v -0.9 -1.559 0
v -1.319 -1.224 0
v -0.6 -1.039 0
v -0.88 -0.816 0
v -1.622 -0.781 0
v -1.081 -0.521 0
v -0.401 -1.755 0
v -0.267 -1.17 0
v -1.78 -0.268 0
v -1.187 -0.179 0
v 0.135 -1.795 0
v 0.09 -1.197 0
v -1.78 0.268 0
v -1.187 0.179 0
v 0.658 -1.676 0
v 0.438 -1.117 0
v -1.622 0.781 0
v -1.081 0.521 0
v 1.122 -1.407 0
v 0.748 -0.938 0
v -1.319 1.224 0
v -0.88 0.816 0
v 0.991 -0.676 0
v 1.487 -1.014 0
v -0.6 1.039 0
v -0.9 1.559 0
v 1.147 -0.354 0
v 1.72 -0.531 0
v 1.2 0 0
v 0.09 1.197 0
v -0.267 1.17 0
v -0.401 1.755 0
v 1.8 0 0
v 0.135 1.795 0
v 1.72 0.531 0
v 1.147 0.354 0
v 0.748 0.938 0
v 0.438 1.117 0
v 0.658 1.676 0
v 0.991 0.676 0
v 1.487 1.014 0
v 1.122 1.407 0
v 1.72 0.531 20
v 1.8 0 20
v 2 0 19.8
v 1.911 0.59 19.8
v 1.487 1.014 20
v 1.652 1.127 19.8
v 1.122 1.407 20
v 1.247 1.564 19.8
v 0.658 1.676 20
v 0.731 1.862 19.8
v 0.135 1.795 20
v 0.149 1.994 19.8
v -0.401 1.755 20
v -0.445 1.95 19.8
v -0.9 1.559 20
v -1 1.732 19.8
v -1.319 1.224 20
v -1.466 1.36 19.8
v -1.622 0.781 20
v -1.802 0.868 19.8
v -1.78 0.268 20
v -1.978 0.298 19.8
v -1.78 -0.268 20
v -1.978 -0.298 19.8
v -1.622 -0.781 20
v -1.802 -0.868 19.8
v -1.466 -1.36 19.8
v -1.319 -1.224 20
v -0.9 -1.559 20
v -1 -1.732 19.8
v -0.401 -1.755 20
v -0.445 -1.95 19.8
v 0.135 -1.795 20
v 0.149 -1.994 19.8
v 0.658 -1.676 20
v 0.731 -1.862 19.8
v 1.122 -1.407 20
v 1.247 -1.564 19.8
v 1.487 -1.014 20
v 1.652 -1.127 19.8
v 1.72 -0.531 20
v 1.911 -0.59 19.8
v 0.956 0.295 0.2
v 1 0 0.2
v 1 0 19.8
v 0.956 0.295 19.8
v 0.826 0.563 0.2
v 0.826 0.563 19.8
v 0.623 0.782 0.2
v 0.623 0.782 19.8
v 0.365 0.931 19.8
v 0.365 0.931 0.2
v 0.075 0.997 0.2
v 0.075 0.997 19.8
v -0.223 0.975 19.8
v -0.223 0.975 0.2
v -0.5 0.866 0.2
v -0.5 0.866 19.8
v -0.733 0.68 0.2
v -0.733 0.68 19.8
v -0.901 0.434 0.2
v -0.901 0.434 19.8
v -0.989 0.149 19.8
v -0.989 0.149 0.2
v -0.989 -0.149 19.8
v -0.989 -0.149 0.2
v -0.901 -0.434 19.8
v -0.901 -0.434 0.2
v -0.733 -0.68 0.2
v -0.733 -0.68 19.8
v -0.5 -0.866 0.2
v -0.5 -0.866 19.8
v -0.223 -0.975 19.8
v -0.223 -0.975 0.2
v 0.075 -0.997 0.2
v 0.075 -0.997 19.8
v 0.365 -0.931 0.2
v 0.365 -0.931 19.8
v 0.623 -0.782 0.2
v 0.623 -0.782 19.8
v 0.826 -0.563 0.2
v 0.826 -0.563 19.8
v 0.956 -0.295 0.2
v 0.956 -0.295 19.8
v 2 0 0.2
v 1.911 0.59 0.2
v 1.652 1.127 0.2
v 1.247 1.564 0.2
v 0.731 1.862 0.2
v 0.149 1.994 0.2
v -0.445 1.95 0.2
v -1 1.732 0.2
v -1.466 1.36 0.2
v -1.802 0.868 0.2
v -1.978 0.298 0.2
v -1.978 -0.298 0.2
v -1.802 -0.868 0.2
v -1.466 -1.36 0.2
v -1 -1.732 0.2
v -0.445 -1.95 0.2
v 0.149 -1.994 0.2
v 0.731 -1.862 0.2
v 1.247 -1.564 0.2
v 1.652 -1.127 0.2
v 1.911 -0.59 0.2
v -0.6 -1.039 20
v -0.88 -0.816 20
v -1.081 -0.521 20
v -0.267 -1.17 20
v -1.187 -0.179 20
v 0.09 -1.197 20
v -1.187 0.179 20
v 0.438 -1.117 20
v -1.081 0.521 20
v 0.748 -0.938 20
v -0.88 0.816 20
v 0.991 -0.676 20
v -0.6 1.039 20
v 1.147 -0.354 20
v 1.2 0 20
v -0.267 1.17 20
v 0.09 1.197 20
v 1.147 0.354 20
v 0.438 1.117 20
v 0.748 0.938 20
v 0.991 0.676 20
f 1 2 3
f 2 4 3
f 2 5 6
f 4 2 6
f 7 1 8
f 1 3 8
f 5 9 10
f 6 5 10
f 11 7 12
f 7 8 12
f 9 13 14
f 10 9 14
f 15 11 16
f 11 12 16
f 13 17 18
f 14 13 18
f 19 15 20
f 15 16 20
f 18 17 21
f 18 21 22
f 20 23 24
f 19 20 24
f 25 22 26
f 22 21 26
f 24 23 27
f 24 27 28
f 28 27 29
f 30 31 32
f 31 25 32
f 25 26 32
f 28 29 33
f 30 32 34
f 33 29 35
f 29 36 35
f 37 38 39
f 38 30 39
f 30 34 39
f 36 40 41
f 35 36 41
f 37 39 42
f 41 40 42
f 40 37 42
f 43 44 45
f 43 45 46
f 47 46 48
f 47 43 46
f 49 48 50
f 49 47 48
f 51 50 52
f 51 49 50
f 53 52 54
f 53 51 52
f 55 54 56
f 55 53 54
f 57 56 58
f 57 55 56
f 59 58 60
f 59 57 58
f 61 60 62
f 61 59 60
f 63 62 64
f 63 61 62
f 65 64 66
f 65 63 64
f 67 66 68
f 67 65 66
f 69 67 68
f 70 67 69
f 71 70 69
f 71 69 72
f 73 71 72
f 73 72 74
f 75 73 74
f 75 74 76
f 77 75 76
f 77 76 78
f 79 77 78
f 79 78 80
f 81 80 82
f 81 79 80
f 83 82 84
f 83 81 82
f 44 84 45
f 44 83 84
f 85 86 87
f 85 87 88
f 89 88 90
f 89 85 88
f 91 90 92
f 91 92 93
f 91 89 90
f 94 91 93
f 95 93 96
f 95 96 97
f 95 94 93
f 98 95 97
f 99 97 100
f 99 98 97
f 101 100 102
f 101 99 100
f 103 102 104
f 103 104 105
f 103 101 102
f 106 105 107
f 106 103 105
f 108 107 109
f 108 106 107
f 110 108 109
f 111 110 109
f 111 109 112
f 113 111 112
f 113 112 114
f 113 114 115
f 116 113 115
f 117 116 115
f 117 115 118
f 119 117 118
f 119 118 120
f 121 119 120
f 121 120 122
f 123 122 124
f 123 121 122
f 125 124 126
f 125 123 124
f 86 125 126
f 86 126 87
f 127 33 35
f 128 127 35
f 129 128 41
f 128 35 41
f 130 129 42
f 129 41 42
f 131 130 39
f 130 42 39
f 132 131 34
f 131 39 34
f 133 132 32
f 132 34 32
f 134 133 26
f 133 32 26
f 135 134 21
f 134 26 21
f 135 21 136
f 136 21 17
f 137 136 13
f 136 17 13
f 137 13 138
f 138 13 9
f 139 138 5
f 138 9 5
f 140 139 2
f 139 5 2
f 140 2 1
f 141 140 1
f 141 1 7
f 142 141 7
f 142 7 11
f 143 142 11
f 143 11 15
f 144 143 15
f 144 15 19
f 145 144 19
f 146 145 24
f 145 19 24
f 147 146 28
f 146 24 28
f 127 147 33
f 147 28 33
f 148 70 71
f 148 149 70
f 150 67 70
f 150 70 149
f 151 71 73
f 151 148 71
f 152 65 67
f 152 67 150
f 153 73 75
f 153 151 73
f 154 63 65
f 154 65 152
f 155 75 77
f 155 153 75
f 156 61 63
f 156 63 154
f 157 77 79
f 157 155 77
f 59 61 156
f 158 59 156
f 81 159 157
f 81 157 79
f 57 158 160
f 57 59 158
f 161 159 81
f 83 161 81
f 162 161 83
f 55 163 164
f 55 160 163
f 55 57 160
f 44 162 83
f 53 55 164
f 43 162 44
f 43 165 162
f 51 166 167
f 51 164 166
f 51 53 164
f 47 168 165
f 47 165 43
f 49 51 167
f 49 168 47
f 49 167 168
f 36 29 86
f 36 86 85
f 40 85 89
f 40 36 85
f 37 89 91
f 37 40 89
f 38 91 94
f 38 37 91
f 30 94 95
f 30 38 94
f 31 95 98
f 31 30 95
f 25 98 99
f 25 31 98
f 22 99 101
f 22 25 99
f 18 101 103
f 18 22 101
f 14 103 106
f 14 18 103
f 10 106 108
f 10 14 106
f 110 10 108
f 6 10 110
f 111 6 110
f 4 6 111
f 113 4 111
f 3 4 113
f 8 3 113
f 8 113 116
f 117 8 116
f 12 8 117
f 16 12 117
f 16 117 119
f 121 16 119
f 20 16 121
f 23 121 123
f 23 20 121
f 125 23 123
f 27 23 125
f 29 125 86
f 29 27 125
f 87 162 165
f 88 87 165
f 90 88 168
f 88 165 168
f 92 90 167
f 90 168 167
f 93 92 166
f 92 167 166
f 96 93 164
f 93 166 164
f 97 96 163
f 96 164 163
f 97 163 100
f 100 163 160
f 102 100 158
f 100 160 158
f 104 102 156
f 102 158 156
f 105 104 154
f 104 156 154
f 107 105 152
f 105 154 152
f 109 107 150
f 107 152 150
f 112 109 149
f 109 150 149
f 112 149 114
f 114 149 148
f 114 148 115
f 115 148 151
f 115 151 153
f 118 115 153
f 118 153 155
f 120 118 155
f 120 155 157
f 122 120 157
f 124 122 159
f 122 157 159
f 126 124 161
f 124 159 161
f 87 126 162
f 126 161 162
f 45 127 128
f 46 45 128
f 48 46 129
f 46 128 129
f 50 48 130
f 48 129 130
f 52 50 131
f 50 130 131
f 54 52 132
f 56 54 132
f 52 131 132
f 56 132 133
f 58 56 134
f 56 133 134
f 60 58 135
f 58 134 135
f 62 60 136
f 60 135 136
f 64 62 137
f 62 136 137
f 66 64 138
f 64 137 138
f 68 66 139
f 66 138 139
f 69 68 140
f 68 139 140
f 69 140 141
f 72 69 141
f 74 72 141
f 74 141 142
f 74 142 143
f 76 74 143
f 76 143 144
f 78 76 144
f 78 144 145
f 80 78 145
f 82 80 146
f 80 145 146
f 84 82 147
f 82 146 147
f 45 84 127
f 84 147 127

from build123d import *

# Parameters (mm, degrees)
SKETCH_1_R      = 2
SKETCH_1_R_2    = 1
EXTRUDE_1_DEPTH = 20
CHAMFER_1_SIZE  = 0.2


with BuildPart() as part:
    # Эскиз1 → Бобышка-Вытянуть1 (new body)
    with BuildSketch(Plane.XY):
        Circle(SKETCH_1_R)
        Circle(SKETCH_1_R_2, mode=Mode.SUBTRACT)
    extrude(amount=EXTRUDE_1_DEPTH)

    # Фаска1
    chamfer_1_edges = [part.edges().sort_by_distance(p)[0] for p in [
        (-2, 0, 0),
        (-2, 0, 20),
        (-1, 0, 0),
        (-1, 0, 20),
    ]]
    chamfer(chamfer_1_edges, length=CHAMFER_1_SIZE)


solid = part.part
